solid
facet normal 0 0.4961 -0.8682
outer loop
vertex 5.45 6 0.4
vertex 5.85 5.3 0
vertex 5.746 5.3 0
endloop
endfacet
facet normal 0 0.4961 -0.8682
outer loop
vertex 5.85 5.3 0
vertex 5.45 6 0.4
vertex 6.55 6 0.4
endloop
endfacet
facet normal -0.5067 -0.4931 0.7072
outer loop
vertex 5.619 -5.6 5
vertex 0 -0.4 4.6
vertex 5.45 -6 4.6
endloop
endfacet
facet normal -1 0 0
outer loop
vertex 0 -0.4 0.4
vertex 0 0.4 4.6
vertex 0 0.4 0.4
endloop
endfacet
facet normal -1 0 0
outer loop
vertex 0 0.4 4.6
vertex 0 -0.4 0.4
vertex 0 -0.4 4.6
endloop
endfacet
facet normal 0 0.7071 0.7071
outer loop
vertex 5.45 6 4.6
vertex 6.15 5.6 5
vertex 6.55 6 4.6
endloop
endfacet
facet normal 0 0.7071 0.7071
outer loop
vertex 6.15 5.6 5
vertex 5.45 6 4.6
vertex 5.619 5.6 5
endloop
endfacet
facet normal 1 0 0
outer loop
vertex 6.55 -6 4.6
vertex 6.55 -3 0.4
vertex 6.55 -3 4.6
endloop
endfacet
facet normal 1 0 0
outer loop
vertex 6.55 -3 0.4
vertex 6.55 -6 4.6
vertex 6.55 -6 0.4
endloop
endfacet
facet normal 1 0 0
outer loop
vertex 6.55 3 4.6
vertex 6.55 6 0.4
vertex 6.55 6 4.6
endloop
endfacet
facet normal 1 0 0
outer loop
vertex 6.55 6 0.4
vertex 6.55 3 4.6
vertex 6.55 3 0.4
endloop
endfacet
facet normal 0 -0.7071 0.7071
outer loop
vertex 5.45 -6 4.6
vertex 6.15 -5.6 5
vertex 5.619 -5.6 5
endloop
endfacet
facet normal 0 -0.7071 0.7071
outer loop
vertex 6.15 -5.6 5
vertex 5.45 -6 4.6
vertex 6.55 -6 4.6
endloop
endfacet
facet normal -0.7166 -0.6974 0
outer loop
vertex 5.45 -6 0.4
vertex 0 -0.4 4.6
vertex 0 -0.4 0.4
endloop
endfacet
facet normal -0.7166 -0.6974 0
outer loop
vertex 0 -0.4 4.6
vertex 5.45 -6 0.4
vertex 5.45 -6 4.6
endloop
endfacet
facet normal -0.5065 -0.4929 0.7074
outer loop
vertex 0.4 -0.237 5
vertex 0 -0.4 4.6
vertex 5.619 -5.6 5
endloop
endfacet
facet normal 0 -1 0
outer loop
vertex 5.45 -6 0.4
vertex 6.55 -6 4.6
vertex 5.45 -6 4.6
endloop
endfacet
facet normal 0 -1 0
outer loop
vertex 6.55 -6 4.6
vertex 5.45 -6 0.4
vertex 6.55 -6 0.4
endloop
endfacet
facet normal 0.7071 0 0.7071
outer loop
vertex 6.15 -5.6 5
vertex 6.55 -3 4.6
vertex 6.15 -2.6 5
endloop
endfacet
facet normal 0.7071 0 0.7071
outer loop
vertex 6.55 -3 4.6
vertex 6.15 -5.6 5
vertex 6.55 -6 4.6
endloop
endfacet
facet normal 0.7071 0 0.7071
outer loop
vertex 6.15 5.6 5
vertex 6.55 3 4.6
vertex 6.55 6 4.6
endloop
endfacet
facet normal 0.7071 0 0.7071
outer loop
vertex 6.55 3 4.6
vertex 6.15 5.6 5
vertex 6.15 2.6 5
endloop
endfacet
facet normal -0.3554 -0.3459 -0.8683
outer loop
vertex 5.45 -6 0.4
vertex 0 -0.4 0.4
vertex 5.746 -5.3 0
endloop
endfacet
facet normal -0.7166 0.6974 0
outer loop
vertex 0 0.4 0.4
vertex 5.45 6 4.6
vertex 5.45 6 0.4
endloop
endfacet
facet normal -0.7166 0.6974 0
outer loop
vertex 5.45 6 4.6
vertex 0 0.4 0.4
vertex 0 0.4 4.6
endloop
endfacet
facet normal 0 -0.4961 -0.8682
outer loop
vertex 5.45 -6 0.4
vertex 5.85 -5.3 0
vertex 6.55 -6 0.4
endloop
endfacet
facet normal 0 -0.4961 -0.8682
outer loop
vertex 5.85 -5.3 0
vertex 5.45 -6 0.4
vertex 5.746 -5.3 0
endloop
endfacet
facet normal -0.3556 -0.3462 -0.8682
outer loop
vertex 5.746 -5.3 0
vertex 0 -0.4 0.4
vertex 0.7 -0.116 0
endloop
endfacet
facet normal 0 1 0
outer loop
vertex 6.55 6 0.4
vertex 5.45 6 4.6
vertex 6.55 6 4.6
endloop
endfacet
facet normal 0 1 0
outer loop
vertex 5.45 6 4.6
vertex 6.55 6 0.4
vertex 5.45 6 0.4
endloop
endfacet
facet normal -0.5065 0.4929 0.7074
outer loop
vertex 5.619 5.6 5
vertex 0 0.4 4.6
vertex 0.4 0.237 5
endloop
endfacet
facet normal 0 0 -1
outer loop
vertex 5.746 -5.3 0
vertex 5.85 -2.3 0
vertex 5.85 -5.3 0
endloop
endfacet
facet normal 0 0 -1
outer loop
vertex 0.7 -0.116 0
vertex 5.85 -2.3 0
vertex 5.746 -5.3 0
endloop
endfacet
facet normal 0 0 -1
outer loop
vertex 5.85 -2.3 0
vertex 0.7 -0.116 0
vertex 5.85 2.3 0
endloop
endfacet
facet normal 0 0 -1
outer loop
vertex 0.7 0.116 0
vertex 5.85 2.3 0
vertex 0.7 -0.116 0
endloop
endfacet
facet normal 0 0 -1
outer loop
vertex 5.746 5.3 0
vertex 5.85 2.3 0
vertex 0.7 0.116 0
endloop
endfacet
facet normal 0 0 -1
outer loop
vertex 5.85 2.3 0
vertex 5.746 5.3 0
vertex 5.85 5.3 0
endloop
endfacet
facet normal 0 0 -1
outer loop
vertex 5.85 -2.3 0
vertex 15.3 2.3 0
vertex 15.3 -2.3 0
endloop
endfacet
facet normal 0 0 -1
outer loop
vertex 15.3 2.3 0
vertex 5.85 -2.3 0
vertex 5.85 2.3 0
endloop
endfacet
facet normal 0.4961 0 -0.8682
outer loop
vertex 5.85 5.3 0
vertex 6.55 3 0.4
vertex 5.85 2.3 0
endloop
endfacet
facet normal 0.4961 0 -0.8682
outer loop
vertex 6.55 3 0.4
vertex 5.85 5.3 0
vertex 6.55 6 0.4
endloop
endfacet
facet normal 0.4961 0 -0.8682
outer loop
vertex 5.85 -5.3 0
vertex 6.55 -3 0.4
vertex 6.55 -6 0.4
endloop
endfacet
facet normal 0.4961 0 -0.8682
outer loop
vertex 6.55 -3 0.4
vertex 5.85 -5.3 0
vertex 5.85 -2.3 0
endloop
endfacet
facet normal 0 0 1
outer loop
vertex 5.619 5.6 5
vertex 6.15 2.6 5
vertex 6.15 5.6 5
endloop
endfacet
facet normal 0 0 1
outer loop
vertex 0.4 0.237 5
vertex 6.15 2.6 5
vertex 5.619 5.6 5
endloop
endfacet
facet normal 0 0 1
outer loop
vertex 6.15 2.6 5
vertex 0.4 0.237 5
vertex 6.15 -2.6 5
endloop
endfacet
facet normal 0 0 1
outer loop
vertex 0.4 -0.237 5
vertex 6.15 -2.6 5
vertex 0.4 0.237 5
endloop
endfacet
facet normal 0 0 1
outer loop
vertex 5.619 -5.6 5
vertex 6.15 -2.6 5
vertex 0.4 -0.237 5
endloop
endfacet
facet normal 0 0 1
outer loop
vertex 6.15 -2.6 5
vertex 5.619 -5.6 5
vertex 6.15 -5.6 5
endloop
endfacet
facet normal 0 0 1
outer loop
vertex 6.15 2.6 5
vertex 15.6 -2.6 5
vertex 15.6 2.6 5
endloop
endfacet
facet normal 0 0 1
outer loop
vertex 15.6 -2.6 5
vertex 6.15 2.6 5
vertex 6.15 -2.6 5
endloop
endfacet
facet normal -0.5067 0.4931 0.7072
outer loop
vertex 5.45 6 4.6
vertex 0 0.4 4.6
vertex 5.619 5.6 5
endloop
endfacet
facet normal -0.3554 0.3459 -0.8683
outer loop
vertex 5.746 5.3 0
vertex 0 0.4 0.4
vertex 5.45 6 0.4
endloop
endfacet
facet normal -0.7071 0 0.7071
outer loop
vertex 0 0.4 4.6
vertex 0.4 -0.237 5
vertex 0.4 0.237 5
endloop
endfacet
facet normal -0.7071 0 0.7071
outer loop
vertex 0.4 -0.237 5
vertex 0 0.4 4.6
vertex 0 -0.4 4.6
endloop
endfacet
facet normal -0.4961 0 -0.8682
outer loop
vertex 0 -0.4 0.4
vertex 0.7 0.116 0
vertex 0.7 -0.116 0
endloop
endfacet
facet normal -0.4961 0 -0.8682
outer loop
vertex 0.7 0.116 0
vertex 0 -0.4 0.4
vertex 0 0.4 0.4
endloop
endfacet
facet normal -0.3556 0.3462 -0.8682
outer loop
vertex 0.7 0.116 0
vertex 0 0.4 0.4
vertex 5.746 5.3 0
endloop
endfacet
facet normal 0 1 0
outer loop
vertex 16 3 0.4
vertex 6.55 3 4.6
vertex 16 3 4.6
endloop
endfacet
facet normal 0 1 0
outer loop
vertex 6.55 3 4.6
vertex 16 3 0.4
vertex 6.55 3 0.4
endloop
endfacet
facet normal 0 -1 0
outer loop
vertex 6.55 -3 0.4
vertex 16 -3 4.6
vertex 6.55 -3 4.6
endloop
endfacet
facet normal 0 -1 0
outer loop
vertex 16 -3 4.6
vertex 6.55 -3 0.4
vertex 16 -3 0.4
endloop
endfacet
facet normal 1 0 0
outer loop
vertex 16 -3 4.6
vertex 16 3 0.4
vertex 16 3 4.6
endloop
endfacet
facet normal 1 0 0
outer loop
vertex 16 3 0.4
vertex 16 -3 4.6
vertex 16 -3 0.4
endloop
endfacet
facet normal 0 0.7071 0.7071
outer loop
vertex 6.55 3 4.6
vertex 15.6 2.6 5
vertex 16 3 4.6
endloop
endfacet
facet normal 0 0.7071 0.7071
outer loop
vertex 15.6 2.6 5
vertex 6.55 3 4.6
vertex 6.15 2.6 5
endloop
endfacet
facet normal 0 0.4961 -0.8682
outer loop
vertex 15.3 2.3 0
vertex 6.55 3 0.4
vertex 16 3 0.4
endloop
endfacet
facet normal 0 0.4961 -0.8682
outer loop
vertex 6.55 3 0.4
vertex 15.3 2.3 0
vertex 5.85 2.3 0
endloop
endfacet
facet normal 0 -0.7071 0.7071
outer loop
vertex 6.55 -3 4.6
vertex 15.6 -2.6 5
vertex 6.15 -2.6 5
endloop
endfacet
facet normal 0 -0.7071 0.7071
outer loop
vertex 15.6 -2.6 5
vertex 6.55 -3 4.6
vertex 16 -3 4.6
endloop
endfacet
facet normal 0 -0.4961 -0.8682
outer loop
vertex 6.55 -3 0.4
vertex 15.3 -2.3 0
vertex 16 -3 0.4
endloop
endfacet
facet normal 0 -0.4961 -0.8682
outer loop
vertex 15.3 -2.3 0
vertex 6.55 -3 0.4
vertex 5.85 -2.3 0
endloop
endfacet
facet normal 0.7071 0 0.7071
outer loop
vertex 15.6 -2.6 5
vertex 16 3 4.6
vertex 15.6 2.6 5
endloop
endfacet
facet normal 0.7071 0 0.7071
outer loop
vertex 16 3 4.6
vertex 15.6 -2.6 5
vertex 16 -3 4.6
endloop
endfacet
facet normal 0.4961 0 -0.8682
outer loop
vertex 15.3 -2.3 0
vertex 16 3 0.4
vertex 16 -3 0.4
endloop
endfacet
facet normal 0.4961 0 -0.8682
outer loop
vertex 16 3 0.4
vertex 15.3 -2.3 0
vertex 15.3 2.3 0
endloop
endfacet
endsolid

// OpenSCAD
length = 16;
width = 12;
height = 5;

eps = 0.0001;

module head_2d() {
  hull() {
    square([eps, 0.8], center=true);
    translate([width/2, 0])
      square([1.1, width], center=true);
  }
}

module tail_2d() {
  translate([width/2 - 1, -width/4])
    square([length - width/2 + 1, width/2]);
}

module extrude() {
  hull() {
    translate([0, 0, height/2])
      linear_extrude(height/2)
        offset(-0.4)
          children();
    
    // Slightly stronger chamfer on bottom.
    linear_extrude(height/2)
      offset(-0.7)
        children();

    translate([0, 0, 0.4])
      linear_extrude(height - 0.8)
        children();
  }
}

module arrow() {
  extrude() head_2d();
  extrude() tail_2d();
}

arrow();
